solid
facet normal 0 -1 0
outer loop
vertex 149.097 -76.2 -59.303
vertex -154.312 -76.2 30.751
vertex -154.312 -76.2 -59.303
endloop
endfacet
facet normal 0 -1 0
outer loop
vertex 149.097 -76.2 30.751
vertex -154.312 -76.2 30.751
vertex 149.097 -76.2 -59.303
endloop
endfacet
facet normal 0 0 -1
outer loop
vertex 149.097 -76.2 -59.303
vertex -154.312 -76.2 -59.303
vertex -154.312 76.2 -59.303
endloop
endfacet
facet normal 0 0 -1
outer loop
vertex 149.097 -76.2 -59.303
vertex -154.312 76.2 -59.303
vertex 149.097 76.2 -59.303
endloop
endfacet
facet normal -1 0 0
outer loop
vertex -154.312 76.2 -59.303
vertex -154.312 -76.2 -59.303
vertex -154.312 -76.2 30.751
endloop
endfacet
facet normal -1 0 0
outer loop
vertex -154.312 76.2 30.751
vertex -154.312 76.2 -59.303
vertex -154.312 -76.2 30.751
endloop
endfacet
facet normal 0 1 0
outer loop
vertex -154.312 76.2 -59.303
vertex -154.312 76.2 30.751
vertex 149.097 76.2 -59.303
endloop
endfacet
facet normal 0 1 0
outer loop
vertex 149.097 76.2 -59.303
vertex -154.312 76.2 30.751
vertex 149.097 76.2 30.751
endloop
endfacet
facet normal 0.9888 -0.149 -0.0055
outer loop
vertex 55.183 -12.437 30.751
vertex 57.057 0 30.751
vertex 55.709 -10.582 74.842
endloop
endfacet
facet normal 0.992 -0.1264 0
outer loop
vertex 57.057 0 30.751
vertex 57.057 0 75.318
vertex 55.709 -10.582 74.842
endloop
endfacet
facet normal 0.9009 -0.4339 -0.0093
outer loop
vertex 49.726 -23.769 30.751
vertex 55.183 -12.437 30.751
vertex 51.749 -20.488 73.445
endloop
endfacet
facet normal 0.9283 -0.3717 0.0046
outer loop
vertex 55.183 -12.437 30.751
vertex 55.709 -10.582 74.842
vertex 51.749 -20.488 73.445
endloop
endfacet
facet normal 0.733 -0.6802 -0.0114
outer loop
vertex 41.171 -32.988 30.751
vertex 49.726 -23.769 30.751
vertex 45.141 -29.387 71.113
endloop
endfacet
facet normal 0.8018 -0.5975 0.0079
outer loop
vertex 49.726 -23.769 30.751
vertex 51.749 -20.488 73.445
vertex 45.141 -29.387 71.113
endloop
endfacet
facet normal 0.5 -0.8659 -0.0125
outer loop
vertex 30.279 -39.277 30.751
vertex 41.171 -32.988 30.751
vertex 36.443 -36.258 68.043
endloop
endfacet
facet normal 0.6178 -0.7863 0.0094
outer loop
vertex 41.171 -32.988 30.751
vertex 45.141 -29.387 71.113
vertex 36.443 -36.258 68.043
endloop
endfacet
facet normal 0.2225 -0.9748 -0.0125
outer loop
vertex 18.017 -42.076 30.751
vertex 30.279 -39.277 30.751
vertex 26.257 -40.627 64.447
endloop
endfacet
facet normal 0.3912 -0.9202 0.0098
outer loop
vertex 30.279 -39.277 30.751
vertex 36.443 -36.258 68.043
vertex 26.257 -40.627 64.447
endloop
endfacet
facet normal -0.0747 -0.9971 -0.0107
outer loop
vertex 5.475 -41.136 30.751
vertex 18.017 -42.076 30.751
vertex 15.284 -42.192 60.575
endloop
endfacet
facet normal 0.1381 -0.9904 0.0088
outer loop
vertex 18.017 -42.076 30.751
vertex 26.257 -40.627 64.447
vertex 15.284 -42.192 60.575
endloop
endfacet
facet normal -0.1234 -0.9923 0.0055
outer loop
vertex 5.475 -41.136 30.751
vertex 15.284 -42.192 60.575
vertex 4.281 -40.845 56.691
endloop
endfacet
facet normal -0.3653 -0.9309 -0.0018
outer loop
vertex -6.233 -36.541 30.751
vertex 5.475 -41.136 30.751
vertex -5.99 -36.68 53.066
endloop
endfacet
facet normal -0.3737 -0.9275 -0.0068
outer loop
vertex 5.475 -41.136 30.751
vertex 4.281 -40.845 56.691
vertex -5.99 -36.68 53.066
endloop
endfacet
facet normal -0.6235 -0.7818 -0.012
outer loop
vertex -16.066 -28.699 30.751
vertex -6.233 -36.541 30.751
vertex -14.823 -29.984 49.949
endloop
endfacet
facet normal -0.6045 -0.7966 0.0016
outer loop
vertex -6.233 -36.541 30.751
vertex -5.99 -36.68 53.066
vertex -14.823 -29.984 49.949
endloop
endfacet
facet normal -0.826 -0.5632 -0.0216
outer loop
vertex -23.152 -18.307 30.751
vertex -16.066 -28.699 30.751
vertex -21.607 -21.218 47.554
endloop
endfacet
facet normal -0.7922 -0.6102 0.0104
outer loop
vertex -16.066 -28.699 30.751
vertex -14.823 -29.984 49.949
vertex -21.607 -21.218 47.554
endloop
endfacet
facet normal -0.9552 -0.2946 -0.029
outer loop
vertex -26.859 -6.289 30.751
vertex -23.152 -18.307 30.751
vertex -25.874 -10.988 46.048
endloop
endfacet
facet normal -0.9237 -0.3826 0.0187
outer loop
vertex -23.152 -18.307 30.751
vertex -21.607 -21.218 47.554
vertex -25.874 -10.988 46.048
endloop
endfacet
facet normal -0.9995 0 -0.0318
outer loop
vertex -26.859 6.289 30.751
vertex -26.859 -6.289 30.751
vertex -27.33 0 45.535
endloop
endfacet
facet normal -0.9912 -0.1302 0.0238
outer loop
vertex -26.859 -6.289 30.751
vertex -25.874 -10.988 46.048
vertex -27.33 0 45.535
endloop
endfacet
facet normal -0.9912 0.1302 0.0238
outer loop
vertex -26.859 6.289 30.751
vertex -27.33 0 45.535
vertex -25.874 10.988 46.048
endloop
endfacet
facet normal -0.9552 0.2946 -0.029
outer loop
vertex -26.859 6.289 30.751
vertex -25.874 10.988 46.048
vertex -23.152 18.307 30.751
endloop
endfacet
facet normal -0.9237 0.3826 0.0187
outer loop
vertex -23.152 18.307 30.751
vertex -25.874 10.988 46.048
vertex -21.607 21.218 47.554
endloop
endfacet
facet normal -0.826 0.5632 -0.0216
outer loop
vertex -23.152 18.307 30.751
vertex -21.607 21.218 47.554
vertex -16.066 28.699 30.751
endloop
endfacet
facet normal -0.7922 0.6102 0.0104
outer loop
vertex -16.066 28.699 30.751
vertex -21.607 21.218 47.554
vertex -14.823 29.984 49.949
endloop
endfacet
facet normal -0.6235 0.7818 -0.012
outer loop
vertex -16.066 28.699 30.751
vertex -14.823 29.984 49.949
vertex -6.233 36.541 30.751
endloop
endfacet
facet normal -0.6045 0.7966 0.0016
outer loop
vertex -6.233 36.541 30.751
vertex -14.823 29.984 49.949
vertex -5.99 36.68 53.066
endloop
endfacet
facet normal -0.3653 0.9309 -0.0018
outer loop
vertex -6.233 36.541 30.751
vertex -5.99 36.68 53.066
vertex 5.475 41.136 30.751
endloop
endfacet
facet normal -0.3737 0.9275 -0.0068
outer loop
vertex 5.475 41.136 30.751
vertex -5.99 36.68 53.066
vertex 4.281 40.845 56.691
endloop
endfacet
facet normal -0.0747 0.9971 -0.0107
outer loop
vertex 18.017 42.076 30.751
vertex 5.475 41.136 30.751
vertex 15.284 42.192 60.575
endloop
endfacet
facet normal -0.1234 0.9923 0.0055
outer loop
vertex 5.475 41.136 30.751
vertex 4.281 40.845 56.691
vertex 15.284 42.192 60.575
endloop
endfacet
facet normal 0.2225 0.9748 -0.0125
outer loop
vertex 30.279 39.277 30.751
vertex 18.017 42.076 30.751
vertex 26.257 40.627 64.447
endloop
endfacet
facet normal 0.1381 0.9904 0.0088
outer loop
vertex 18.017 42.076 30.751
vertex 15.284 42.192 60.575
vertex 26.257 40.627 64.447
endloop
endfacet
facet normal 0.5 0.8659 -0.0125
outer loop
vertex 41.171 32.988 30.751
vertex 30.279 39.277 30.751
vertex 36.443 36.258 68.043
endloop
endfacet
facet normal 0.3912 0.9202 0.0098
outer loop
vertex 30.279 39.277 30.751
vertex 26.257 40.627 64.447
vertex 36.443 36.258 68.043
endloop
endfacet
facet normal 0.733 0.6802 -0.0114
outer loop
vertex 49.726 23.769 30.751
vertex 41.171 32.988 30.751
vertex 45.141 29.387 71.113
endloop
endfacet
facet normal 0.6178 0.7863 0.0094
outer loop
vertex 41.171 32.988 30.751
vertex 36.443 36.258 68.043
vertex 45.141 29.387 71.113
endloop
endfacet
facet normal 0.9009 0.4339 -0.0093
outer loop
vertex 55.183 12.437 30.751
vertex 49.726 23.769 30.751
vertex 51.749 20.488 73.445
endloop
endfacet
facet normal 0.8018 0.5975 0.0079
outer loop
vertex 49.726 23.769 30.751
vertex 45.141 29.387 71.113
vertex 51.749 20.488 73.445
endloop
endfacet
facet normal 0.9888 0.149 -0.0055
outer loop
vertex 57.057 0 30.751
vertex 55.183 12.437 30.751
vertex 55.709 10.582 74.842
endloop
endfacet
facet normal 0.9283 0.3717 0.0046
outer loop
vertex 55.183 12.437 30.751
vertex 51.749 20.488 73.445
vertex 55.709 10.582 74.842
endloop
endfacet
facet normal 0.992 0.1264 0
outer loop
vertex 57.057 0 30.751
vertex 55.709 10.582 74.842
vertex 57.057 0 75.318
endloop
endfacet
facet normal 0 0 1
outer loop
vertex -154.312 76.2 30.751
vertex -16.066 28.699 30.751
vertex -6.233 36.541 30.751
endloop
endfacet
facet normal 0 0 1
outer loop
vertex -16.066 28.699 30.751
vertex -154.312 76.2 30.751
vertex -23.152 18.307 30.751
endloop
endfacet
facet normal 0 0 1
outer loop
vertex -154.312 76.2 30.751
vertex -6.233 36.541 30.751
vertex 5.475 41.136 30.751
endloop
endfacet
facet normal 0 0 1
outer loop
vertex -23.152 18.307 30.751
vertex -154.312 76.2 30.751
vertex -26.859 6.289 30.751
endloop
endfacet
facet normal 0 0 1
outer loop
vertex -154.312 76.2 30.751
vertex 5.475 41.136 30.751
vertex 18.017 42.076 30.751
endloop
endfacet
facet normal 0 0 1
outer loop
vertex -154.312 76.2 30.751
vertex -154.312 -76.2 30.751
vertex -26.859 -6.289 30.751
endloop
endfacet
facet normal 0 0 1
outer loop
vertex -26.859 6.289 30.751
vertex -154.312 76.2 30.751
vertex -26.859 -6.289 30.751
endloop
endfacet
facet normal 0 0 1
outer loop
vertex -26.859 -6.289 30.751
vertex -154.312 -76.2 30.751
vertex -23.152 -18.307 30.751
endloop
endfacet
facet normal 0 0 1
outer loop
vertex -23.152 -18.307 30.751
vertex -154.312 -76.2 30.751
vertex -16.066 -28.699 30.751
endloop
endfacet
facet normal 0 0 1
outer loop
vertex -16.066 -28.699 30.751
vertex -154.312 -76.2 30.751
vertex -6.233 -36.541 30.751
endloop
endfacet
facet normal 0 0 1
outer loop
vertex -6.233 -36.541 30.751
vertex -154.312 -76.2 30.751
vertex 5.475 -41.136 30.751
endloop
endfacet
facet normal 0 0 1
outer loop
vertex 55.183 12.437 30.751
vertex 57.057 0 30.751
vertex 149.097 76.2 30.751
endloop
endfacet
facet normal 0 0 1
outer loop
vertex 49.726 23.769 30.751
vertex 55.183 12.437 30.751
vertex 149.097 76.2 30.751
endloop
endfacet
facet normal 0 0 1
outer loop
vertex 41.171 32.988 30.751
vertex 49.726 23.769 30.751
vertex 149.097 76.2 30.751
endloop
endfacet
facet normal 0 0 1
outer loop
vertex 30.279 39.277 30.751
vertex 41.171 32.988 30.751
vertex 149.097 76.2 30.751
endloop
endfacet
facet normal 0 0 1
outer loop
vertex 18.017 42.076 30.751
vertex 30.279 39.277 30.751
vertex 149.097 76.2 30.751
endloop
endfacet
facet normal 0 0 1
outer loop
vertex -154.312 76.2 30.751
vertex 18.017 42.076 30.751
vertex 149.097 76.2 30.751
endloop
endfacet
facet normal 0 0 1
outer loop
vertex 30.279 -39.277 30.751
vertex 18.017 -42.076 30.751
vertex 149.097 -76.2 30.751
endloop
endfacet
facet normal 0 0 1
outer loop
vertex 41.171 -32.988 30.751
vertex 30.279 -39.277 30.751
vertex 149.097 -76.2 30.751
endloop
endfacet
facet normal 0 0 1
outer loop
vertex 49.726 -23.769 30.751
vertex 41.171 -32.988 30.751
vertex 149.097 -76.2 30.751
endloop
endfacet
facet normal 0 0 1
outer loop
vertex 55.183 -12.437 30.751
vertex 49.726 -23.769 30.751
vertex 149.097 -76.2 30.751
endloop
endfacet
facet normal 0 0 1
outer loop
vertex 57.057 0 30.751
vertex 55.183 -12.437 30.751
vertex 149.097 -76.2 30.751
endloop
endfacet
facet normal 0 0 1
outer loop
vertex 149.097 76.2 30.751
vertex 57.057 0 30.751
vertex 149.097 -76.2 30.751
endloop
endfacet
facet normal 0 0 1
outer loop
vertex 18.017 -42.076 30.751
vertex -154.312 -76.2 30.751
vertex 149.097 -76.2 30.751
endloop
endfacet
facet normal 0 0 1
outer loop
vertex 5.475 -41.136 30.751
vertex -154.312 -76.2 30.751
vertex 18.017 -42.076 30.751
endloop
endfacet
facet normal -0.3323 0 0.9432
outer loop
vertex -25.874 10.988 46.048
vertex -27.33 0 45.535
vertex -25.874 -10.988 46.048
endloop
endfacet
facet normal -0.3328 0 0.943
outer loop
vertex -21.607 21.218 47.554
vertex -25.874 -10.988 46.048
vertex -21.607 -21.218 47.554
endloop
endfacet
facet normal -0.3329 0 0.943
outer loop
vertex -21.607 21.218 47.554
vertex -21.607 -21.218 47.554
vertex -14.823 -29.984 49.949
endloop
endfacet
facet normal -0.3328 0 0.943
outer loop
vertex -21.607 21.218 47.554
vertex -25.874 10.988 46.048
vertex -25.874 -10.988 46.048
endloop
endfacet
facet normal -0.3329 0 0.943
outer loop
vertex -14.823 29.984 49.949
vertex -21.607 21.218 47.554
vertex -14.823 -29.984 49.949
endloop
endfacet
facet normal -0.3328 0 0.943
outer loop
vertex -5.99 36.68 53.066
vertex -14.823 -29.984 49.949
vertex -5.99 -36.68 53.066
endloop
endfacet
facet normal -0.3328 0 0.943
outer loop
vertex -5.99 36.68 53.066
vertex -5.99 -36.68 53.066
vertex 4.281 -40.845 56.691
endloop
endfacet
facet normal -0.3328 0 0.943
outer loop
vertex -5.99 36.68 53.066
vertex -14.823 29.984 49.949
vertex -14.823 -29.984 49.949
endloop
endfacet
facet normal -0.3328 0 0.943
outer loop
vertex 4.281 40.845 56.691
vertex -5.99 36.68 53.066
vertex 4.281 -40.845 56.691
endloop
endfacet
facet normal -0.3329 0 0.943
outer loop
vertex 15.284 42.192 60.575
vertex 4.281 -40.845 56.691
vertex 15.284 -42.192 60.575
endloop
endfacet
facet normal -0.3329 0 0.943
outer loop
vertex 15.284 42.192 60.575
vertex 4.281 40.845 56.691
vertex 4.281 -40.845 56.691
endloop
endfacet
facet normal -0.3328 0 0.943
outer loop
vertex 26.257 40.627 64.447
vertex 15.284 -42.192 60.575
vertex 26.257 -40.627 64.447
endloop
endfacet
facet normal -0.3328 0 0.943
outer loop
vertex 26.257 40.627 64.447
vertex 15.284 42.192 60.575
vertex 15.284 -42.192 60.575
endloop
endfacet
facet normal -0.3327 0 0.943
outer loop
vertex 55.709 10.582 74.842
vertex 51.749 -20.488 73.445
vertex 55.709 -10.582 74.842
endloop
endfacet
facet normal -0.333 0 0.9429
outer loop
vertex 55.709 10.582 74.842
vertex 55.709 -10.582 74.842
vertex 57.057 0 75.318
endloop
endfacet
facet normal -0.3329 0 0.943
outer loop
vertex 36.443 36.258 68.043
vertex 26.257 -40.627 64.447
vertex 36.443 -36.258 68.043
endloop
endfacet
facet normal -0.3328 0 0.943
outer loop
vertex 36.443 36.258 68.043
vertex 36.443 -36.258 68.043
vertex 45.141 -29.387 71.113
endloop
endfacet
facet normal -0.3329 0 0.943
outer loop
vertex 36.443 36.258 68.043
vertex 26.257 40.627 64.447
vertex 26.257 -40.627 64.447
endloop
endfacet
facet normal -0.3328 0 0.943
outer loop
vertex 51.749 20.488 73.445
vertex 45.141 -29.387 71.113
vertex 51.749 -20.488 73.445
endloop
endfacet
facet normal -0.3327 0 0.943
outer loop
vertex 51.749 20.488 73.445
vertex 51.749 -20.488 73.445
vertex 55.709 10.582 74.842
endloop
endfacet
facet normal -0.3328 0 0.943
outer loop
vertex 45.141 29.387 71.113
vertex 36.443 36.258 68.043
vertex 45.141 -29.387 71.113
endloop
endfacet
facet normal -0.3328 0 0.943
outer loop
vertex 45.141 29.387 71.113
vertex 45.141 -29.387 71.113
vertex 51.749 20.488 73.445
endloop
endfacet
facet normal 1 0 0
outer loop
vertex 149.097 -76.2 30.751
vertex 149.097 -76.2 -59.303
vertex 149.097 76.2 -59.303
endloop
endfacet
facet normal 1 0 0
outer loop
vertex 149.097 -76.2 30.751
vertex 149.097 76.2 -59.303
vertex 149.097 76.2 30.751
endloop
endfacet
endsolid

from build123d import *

# Parameters (mm, degrees)
F0_W          = 303.4089505672
F0_H          = 90.0540538132
F2_DEPTH      = 76.2
F2_DEPTH_BACK = 76.2
F5_DEPTH      = 50.8
F5_DEPTH_BACK = 50.8


with BuildPart() as f2:
    # F0 (on Front) → F2 (new body, two sides)
    with BuildSketch(Plane.XZ) as f2_sk:
        with Locations((-2.6078522205, -14.2760109156)):
            Rectangle(F0_W, F0_H)
    extrude(amount=F2_DEPTH)
    extrude(f2_sk.sketch, amount=-F2_DEPTH_BACK)

    # F1 (on Front) → F3 (revolve)
    with BuildSketch(Plane.XZ):
        Polygon((57.057470793, -54.4762127101), (57.057470793, 76.3475820422), (14.8637248203, 62.2137170317), (14.8637248203, -54.4762127101), align=None)
        Polygon((57.057470793, 76.3475820422), (14.8637248203, 76.3475820422), (14.8637248203, 62.2137170317), align=None)
    revolve(axis=Axis((14.8637248203, 0, 10.935684666), (0, 0, -1)))

    # F4 (on Front) → F5 (cut, two sides)
    with BuildSketch(Plane.XZ) as f5_sk:
        Polygon((-45.7748621702, 39.0245653689), (70.5238878727, 80.0711810589), (-45.7748621702, 80.3245604038), align=None)
    extrude(amount=-F5_DEPTH, mode=Mode.SUBTRACT)
    extrude(f5_sk.sketch, amount=F5_DEPTH_BACK, mode=Mode.SUBTRACT)


solid = f2.part
